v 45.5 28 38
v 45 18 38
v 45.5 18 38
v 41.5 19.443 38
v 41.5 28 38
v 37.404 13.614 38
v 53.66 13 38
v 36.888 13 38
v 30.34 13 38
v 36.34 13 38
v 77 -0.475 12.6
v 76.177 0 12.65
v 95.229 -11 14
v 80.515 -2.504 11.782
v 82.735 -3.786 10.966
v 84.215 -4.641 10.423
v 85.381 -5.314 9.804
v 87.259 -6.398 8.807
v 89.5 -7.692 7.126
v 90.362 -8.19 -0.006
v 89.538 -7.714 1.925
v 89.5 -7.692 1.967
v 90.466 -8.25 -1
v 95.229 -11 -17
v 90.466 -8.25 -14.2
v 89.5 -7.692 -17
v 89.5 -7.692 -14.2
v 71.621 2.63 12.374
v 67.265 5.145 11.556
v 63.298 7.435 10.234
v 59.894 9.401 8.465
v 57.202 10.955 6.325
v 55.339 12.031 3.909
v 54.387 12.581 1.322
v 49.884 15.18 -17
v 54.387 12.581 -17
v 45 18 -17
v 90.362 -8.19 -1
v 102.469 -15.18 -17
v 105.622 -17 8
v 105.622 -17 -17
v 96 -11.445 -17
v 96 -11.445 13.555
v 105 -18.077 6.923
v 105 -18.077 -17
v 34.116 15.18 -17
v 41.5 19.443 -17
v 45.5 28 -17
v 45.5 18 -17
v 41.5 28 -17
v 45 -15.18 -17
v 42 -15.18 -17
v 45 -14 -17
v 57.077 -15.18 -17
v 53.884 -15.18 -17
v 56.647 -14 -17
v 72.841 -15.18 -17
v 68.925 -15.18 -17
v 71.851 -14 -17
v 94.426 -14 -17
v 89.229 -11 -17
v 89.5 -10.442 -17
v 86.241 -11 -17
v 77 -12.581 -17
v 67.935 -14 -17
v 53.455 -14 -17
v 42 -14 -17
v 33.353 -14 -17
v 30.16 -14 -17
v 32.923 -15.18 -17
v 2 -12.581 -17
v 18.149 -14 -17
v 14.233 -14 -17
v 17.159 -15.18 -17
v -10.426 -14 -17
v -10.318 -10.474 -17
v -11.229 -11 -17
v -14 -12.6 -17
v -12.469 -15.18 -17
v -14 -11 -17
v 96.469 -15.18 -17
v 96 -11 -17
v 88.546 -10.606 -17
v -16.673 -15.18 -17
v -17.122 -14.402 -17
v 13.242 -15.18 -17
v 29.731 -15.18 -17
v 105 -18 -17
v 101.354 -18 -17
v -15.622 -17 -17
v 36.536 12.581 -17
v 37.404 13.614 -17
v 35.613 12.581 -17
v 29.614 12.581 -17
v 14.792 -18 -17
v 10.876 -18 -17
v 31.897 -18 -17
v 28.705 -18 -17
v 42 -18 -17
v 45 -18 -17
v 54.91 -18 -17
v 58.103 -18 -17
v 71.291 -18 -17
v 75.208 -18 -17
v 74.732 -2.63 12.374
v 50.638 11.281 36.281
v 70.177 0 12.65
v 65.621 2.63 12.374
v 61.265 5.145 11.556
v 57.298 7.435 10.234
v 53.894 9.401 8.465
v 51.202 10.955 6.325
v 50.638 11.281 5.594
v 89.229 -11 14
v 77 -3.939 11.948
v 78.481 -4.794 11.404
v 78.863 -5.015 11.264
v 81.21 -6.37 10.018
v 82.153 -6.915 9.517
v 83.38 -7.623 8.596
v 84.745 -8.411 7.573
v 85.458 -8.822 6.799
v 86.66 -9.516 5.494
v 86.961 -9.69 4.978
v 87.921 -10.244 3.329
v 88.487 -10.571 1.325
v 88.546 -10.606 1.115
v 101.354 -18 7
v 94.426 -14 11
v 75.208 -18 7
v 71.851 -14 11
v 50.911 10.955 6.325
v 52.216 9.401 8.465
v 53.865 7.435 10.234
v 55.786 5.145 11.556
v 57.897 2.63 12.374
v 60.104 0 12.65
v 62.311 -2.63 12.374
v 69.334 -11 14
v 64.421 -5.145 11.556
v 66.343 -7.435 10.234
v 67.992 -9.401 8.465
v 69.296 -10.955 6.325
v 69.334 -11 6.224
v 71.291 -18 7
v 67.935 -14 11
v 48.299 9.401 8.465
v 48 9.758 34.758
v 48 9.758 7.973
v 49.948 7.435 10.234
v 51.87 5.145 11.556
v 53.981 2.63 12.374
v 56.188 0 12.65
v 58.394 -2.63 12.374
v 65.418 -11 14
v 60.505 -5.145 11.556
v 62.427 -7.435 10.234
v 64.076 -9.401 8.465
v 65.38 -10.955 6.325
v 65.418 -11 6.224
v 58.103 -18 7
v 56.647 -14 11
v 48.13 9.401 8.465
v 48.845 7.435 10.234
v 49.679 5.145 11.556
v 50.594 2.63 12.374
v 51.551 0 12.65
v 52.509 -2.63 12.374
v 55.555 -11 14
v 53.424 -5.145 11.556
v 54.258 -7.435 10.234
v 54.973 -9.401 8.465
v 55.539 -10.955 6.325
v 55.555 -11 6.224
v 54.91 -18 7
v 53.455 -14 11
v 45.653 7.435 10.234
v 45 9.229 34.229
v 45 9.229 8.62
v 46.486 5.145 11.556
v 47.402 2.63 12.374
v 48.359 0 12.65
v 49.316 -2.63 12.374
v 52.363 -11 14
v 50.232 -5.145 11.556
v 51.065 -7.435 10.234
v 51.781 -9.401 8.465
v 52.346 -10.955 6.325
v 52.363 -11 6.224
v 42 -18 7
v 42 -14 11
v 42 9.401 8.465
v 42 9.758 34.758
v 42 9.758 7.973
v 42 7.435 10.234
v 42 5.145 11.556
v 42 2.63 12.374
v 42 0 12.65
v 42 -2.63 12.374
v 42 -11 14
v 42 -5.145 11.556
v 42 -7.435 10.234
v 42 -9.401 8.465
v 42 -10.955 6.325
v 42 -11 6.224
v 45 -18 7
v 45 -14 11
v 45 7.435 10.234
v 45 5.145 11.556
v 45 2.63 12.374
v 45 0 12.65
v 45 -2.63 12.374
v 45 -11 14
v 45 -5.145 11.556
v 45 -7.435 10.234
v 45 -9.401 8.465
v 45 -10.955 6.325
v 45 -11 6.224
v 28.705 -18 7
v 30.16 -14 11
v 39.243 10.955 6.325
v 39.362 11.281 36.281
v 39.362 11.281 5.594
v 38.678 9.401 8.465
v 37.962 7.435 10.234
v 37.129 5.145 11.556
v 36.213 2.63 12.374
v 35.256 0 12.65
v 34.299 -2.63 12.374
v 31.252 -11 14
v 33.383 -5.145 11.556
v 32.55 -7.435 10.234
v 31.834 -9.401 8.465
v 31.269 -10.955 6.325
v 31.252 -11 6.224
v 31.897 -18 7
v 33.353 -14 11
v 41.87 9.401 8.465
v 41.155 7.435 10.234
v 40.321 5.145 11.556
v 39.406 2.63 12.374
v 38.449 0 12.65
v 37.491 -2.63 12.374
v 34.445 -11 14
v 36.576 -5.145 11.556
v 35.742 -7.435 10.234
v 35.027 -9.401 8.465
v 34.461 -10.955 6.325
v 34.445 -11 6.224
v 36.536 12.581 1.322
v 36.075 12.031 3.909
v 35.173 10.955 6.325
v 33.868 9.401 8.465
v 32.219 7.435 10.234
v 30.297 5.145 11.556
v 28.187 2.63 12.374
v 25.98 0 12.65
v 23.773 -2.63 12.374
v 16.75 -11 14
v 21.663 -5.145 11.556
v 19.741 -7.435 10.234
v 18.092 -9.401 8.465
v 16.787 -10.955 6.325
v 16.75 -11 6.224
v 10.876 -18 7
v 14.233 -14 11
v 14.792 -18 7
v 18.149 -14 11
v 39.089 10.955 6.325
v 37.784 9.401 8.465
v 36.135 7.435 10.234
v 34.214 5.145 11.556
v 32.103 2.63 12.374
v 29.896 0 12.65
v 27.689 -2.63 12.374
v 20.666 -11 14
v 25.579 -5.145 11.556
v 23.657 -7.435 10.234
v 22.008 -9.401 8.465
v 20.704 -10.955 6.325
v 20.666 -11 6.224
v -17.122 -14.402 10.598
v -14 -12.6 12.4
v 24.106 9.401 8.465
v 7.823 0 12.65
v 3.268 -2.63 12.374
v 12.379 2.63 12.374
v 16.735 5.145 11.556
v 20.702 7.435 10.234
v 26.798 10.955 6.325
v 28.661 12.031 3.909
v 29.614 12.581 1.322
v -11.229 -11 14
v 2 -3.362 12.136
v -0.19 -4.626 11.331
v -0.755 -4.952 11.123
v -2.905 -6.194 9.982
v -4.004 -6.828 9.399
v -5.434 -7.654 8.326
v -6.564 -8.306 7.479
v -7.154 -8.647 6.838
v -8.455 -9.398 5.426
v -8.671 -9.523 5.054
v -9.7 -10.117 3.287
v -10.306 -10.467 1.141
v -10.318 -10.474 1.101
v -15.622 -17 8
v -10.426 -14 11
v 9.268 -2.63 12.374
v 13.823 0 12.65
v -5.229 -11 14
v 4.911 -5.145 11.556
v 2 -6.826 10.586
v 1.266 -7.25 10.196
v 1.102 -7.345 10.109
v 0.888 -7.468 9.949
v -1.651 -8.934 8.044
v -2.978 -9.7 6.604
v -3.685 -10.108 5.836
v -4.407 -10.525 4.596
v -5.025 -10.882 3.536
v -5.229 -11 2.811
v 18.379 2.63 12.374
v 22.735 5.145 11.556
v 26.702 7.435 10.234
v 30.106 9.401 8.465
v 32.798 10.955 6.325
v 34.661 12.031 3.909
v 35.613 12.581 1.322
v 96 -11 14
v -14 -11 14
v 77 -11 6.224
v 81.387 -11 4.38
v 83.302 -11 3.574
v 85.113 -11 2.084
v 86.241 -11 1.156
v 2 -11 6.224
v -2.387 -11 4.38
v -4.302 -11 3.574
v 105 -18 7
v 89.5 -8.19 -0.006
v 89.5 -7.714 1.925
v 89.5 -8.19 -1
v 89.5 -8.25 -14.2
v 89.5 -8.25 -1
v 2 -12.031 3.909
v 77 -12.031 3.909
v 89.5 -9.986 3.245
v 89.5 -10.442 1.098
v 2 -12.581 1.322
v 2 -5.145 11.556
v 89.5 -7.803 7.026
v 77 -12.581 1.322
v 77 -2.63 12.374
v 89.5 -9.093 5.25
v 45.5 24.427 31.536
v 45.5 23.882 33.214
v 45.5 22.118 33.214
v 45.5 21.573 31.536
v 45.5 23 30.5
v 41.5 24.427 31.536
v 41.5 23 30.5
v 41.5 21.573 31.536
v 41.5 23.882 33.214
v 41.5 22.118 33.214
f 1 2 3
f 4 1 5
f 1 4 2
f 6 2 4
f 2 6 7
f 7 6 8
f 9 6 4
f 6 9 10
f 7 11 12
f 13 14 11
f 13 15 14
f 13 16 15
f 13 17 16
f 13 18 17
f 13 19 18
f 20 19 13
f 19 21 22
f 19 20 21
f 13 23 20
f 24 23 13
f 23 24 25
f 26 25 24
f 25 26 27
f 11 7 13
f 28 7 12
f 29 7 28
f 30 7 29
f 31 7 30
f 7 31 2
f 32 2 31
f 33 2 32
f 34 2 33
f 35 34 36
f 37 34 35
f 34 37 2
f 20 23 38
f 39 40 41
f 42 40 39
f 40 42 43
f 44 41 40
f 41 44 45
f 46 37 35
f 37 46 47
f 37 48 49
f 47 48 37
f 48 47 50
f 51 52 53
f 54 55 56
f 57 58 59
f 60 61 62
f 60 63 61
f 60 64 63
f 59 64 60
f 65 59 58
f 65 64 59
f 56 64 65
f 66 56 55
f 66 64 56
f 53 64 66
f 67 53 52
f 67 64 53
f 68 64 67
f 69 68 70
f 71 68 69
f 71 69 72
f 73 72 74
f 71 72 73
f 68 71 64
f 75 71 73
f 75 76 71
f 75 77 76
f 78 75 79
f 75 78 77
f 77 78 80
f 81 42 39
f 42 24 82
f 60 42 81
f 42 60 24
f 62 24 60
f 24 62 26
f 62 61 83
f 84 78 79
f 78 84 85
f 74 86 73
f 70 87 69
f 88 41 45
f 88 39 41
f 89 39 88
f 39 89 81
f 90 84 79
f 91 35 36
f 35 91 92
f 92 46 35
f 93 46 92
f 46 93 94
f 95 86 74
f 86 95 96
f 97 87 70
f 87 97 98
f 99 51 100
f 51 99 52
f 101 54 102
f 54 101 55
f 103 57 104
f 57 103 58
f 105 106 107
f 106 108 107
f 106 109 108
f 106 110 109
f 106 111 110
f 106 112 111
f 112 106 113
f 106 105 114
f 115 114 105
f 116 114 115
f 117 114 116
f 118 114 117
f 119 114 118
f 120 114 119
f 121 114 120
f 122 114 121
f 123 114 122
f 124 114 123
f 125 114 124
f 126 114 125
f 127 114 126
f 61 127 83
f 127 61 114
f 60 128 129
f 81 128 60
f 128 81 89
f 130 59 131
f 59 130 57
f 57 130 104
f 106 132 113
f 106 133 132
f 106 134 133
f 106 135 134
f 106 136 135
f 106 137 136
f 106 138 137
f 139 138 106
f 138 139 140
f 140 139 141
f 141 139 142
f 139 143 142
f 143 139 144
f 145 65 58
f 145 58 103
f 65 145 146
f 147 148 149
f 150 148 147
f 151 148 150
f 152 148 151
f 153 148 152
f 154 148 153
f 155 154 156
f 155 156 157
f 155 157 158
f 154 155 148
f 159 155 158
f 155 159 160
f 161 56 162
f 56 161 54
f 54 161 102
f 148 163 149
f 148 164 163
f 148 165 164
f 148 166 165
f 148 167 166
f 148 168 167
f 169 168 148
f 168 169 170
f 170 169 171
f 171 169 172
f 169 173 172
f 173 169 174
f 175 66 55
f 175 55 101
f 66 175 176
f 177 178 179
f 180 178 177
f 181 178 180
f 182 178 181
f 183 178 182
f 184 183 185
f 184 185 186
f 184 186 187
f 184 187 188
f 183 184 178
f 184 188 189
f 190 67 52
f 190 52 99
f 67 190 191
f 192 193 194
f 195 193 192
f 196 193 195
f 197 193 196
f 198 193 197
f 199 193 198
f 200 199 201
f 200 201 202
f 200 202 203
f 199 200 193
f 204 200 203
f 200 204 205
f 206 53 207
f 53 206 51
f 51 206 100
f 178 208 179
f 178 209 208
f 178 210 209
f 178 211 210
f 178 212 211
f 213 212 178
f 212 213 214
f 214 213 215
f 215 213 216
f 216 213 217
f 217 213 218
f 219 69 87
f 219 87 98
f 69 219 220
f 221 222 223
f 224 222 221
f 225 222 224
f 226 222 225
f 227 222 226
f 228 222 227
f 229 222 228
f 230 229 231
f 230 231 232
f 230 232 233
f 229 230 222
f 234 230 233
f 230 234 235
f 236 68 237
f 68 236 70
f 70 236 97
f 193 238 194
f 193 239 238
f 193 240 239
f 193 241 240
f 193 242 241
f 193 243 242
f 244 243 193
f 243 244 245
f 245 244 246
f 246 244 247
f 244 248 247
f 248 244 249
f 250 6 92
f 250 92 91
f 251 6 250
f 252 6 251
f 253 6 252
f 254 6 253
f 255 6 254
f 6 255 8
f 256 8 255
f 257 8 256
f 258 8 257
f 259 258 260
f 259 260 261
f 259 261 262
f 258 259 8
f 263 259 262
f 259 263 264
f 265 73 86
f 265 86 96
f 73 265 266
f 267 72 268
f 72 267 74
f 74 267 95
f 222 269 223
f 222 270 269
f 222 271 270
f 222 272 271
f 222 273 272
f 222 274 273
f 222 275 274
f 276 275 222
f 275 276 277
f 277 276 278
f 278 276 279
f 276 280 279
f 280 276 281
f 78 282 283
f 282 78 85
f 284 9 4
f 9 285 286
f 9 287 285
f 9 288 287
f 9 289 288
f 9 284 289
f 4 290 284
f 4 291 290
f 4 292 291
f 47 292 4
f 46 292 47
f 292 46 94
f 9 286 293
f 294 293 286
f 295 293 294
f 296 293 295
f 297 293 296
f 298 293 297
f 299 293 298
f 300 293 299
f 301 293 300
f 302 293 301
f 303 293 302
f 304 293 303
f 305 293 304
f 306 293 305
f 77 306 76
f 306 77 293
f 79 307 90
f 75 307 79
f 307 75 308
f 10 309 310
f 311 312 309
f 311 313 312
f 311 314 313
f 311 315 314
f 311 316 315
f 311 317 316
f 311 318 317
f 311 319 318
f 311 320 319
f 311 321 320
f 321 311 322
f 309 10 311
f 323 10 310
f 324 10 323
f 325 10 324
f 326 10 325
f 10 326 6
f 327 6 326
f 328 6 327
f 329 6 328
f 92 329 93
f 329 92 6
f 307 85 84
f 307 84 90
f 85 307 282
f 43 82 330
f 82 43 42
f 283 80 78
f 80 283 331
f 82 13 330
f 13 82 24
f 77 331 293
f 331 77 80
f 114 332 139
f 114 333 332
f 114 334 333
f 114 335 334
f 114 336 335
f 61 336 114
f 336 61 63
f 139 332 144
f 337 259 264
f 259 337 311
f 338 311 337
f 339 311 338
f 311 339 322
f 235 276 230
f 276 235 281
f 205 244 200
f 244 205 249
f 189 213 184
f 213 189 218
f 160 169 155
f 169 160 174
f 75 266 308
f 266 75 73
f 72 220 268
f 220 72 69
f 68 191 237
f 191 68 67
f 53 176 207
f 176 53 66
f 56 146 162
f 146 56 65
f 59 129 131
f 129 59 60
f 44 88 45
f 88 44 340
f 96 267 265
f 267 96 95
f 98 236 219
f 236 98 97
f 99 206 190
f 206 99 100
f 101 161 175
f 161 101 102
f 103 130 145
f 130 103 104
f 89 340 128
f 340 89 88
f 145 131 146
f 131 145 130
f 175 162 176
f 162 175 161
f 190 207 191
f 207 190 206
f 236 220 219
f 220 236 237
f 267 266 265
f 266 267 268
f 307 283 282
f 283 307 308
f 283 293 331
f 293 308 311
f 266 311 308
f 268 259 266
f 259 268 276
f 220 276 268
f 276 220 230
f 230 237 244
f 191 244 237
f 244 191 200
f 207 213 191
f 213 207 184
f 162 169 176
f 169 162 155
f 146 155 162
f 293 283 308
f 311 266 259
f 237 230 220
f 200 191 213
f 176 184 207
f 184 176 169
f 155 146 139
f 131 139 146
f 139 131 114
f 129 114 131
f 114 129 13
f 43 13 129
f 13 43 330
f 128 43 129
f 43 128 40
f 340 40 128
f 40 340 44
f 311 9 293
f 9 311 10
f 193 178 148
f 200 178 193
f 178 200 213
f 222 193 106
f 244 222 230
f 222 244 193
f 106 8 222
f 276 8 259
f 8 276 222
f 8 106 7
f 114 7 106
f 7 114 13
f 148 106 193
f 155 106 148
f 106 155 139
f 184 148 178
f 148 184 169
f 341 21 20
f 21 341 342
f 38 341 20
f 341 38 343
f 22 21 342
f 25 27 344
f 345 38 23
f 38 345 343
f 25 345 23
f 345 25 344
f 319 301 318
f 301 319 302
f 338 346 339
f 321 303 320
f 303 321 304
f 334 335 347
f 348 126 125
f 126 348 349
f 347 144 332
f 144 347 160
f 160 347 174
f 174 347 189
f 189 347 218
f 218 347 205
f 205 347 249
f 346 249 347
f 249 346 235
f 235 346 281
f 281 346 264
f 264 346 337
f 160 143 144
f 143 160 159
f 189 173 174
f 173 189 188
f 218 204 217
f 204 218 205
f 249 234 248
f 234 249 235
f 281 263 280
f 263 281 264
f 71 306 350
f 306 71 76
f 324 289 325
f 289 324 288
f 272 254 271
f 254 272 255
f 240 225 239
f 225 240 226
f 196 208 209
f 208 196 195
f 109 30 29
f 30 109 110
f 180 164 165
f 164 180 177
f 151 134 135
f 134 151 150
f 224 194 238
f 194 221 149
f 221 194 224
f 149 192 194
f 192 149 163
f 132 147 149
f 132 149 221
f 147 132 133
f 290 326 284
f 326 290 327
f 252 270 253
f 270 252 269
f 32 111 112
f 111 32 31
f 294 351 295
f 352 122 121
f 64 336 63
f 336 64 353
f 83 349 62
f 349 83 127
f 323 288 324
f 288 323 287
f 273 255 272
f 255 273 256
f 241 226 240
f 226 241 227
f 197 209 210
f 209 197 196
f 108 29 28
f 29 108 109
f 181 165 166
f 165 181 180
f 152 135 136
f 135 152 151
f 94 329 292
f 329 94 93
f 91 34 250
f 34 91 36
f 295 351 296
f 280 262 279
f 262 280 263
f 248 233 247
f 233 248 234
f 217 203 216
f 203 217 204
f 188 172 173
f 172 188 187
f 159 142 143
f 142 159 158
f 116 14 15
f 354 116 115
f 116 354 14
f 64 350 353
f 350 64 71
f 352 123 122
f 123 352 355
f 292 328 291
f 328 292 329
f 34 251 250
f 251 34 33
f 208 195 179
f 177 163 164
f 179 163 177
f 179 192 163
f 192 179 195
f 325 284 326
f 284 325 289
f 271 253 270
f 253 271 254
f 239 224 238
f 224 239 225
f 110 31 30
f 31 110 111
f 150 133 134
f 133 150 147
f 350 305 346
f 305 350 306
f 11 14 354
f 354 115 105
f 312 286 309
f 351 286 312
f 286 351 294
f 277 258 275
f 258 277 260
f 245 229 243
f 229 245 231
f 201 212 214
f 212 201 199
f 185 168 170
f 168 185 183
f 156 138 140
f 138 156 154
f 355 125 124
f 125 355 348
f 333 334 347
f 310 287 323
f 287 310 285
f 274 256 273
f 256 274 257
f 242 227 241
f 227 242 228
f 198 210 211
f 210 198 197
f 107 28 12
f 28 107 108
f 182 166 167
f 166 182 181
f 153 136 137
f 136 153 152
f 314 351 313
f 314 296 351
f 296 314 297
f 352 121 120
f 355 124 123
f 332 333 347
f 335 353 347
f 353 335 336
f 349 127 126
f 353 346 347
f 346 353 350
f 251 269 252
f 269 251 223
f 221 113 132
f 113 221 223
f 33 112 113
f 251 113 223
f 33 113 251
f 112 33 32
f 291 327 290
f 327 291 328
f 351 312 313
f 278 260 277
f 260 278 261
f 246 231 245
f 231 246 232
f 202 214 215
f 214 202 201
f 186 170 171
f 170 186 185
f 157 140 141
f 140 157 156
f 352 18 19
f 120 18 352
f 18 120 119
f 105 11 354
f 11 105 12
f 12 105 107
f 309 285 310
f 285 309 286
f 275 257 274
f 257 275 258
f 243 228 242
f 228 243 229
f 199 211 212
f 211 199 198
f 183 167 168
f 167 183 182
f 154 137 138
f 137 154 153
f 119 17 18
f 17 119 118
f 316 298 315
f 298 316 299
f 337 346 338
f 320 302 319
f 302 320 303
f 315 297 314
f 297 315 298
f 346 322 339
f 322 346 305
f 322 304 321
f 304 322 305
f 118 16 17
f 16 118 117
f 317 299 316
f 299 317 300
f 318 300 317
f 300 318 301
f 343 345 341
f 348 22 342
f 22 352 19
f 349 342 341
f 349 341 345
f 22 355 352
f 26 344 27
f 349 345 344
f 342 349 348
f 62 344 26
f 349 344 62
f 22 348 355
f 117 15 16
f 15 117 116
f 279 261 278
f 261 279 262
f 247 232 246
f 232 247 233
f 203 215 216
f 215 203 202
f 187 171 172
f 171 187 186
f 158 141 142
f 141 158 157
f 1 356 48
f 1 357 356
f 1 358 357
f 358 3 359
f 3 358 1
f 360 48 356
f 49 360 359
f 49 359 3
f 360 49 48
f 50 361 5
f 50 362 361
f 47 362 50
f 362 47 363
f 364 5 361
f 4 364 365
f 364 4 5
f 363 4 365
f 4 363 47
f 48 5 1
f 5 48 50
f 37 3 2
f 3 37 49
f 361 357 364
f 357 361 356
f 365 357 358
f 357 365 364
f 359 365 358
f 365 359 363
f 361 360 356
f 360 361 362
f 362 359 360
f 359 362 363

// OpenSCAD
// file: model_testing/belkin_power_bank.scad
BIG_RAD = 25.3/2;
SMALL_RAD=21/2;

BIG_RAD_LEN = 75;
TAPER_LEN=12.5;

belkin_whole_len = BIG_RAD_LEN + 2 * TAPER_LEN;

PACK_WIDTH = 65;
side_dist = PACK_WIDTH - (BIG_RAD * 2);



module pack_side(){
    cylinder(h=BIG_RAD_LEN, r=BIG_RAD);
    translate([0,0,BIG_RAD_LEN]){
        cylinder(h=TAPER_LEN, r1=BIG_RAD, r2=SMALL_RAD);
    }
    translate([0,0,-TAPER_LEN]){
        cylinder(h=TAPER_LEN, r2=BIG_RAD, r1=SMALL_RAD);
    }
}

module belkin_power_bank(){
    hull(){
        pack_side();
        translate([side_dist,0,0]){
            pack_side();
        }
    }
}
// main file
//######################################################################
//  BATTERY holder   
include <model_testing/belkin_power_bank.scad>


PCB_ARM_TN = 4;
PCB_ARM_WD = 10;
PCB_ARM_YPOSI = -15;







NEG_CAV_SCALE = 1.0;

module top_battery_cup_vent(){
    points = [
        [-3, 15],
        [3, 15],
        [0,0]
    ];
    translate([0,BIG_RAD*1.2,0]){
        rotate([90,0,0]){
            linear_extrude(height= 30){
                polygon(points);
            }
        }
    }
}

//TOP_BATT_HOLDER_LIP = 4.5;







TOP_BATT_HOLDER_LIP = 4.5;
module top_battery_cup(){
    difference(){
        union(){
            // define the outer surface
            // rotate([0,90,0]){
            //     scale([1.1,1.1,1.05]){
            //         belkin_power_bank();
            //     }
            // }
            batt_fins();
        }
        // define the inner
        translate([2,0,0]){
            rotate([0,90,0]){
                scale([NEG_CAV_SCALE,NEG_CAV_SCALE,NEG_CAV_SCALE]){
                    belkin_power_bank();
                }
            }
        }
        // chop off what we don't want
        translate([-40,-BIG_RAD * 1.2,-95]){
            cube([belkin_whole_len*1.5,BIG_RAD*2.4,PACK_WIDTH*1.2]);
        }
        
        // chop out end for plugs
        translate([88,0,-1]){
            rotate([180,0,0]){
                rotate([0,90,0]){
                    cylinder(h=6,r=SMALL_RAD-(TOP_BATT_HOLDER_LIP/2));
                }
                square_side=SMALL_RAD*2-(TOP_BATT_HOLDER_LIP);
                translate([0,-square_side/2,0]){
                    cube([6,square_side,square_side * 0.8]);
                }
            }
        }
        // for(i=[0:15:BIG_RAD_LEN]){
        //     translate([i,0,0]){
        //         top_battery_cup_vent();
        //     }
        // }
        
        
        
        // // for a chopped out cross section
        // translate([-BIG_RAD * 3.2,-BIG_RAD * 1.2, -30]){
        //     cube([PACK_WIDTH*1.2,BIG_RAD*2.4,belkin_whole_len]);
        // }
        
    }
    // Connector tab
    TAB_LEN = 55;
    translate([41.5,18,TAB_LEN - 65]){
        translate([0,0,-7]){
            difference(){
                cube([PCB_ARM_TN,PCB_ARM_WD,TAB_LEN]);
            
                translate([-2,PCB_ARM_WD/2,TAB_LEN-PCB_ARM_WD/2-1]){
                    rotate(90,[0,1,0]){
                        cylinder(h=8,r=3/2);
                    }
                }
            }
        }
        // translate([-15,-PCB_ARM_TN -0.3 ,-7.0]){
        //     cube([30,PCB_ARM_TN * 1.1,PCB_ARM_WD]);
        // }
    }
}

module top_batt_tab(){
    TAB_LEN = 19.5;
    cube([PCB_ARM_WD * 1.5, 30,PCB_ARM_TN]);
    difference(){
        translate([(PCB_ARM_WD * 1.5)/2,10,0]){
            cube([PCB_ARM_TN,PCB_ARM_WD,20]);
        }
        translate([5,15,TAB_LEN-(PCB_ARM_WD/2)]){
            rotate([0, 90, 0]) {
                cylinder(h=8,r=3/2);
            }
            
        }
    }
}



module batt_fins(){
    angles = [
        60,
        40,
        20,
        0,
        -20,
        -40,
        -60
    ];
    difference(){
        union(){
            translate([belkin_whole_len/2-5,18,-17]){ 
                rotate([0,0,180]){
                    for(ang=angles){
                        rotate([0,0,ang]){
                            translate([0,0,0]){
                                cube([3,70,55],center=false);
                            }
                        } 
                    }
                }
            }
            translate([-14,-14,-17]){ 
                cube([110,3,40],center=false);
            }
            translate([-14,-14,-17]){ 
                cube([110,3,40],center=false);
            }
        }
        translate([30,-38,0]){
            cube([150,40,80],center=true);
        }
        translate([-30,-20,5]){
            rotate([45,0,0]){
                cube([150,60,40]);
            } 
        }
    }
    
    

    // translate([39,17,-17]){ 
    //     cube([3,10,40],center=false);
    // }

}








top_battery_cup();
